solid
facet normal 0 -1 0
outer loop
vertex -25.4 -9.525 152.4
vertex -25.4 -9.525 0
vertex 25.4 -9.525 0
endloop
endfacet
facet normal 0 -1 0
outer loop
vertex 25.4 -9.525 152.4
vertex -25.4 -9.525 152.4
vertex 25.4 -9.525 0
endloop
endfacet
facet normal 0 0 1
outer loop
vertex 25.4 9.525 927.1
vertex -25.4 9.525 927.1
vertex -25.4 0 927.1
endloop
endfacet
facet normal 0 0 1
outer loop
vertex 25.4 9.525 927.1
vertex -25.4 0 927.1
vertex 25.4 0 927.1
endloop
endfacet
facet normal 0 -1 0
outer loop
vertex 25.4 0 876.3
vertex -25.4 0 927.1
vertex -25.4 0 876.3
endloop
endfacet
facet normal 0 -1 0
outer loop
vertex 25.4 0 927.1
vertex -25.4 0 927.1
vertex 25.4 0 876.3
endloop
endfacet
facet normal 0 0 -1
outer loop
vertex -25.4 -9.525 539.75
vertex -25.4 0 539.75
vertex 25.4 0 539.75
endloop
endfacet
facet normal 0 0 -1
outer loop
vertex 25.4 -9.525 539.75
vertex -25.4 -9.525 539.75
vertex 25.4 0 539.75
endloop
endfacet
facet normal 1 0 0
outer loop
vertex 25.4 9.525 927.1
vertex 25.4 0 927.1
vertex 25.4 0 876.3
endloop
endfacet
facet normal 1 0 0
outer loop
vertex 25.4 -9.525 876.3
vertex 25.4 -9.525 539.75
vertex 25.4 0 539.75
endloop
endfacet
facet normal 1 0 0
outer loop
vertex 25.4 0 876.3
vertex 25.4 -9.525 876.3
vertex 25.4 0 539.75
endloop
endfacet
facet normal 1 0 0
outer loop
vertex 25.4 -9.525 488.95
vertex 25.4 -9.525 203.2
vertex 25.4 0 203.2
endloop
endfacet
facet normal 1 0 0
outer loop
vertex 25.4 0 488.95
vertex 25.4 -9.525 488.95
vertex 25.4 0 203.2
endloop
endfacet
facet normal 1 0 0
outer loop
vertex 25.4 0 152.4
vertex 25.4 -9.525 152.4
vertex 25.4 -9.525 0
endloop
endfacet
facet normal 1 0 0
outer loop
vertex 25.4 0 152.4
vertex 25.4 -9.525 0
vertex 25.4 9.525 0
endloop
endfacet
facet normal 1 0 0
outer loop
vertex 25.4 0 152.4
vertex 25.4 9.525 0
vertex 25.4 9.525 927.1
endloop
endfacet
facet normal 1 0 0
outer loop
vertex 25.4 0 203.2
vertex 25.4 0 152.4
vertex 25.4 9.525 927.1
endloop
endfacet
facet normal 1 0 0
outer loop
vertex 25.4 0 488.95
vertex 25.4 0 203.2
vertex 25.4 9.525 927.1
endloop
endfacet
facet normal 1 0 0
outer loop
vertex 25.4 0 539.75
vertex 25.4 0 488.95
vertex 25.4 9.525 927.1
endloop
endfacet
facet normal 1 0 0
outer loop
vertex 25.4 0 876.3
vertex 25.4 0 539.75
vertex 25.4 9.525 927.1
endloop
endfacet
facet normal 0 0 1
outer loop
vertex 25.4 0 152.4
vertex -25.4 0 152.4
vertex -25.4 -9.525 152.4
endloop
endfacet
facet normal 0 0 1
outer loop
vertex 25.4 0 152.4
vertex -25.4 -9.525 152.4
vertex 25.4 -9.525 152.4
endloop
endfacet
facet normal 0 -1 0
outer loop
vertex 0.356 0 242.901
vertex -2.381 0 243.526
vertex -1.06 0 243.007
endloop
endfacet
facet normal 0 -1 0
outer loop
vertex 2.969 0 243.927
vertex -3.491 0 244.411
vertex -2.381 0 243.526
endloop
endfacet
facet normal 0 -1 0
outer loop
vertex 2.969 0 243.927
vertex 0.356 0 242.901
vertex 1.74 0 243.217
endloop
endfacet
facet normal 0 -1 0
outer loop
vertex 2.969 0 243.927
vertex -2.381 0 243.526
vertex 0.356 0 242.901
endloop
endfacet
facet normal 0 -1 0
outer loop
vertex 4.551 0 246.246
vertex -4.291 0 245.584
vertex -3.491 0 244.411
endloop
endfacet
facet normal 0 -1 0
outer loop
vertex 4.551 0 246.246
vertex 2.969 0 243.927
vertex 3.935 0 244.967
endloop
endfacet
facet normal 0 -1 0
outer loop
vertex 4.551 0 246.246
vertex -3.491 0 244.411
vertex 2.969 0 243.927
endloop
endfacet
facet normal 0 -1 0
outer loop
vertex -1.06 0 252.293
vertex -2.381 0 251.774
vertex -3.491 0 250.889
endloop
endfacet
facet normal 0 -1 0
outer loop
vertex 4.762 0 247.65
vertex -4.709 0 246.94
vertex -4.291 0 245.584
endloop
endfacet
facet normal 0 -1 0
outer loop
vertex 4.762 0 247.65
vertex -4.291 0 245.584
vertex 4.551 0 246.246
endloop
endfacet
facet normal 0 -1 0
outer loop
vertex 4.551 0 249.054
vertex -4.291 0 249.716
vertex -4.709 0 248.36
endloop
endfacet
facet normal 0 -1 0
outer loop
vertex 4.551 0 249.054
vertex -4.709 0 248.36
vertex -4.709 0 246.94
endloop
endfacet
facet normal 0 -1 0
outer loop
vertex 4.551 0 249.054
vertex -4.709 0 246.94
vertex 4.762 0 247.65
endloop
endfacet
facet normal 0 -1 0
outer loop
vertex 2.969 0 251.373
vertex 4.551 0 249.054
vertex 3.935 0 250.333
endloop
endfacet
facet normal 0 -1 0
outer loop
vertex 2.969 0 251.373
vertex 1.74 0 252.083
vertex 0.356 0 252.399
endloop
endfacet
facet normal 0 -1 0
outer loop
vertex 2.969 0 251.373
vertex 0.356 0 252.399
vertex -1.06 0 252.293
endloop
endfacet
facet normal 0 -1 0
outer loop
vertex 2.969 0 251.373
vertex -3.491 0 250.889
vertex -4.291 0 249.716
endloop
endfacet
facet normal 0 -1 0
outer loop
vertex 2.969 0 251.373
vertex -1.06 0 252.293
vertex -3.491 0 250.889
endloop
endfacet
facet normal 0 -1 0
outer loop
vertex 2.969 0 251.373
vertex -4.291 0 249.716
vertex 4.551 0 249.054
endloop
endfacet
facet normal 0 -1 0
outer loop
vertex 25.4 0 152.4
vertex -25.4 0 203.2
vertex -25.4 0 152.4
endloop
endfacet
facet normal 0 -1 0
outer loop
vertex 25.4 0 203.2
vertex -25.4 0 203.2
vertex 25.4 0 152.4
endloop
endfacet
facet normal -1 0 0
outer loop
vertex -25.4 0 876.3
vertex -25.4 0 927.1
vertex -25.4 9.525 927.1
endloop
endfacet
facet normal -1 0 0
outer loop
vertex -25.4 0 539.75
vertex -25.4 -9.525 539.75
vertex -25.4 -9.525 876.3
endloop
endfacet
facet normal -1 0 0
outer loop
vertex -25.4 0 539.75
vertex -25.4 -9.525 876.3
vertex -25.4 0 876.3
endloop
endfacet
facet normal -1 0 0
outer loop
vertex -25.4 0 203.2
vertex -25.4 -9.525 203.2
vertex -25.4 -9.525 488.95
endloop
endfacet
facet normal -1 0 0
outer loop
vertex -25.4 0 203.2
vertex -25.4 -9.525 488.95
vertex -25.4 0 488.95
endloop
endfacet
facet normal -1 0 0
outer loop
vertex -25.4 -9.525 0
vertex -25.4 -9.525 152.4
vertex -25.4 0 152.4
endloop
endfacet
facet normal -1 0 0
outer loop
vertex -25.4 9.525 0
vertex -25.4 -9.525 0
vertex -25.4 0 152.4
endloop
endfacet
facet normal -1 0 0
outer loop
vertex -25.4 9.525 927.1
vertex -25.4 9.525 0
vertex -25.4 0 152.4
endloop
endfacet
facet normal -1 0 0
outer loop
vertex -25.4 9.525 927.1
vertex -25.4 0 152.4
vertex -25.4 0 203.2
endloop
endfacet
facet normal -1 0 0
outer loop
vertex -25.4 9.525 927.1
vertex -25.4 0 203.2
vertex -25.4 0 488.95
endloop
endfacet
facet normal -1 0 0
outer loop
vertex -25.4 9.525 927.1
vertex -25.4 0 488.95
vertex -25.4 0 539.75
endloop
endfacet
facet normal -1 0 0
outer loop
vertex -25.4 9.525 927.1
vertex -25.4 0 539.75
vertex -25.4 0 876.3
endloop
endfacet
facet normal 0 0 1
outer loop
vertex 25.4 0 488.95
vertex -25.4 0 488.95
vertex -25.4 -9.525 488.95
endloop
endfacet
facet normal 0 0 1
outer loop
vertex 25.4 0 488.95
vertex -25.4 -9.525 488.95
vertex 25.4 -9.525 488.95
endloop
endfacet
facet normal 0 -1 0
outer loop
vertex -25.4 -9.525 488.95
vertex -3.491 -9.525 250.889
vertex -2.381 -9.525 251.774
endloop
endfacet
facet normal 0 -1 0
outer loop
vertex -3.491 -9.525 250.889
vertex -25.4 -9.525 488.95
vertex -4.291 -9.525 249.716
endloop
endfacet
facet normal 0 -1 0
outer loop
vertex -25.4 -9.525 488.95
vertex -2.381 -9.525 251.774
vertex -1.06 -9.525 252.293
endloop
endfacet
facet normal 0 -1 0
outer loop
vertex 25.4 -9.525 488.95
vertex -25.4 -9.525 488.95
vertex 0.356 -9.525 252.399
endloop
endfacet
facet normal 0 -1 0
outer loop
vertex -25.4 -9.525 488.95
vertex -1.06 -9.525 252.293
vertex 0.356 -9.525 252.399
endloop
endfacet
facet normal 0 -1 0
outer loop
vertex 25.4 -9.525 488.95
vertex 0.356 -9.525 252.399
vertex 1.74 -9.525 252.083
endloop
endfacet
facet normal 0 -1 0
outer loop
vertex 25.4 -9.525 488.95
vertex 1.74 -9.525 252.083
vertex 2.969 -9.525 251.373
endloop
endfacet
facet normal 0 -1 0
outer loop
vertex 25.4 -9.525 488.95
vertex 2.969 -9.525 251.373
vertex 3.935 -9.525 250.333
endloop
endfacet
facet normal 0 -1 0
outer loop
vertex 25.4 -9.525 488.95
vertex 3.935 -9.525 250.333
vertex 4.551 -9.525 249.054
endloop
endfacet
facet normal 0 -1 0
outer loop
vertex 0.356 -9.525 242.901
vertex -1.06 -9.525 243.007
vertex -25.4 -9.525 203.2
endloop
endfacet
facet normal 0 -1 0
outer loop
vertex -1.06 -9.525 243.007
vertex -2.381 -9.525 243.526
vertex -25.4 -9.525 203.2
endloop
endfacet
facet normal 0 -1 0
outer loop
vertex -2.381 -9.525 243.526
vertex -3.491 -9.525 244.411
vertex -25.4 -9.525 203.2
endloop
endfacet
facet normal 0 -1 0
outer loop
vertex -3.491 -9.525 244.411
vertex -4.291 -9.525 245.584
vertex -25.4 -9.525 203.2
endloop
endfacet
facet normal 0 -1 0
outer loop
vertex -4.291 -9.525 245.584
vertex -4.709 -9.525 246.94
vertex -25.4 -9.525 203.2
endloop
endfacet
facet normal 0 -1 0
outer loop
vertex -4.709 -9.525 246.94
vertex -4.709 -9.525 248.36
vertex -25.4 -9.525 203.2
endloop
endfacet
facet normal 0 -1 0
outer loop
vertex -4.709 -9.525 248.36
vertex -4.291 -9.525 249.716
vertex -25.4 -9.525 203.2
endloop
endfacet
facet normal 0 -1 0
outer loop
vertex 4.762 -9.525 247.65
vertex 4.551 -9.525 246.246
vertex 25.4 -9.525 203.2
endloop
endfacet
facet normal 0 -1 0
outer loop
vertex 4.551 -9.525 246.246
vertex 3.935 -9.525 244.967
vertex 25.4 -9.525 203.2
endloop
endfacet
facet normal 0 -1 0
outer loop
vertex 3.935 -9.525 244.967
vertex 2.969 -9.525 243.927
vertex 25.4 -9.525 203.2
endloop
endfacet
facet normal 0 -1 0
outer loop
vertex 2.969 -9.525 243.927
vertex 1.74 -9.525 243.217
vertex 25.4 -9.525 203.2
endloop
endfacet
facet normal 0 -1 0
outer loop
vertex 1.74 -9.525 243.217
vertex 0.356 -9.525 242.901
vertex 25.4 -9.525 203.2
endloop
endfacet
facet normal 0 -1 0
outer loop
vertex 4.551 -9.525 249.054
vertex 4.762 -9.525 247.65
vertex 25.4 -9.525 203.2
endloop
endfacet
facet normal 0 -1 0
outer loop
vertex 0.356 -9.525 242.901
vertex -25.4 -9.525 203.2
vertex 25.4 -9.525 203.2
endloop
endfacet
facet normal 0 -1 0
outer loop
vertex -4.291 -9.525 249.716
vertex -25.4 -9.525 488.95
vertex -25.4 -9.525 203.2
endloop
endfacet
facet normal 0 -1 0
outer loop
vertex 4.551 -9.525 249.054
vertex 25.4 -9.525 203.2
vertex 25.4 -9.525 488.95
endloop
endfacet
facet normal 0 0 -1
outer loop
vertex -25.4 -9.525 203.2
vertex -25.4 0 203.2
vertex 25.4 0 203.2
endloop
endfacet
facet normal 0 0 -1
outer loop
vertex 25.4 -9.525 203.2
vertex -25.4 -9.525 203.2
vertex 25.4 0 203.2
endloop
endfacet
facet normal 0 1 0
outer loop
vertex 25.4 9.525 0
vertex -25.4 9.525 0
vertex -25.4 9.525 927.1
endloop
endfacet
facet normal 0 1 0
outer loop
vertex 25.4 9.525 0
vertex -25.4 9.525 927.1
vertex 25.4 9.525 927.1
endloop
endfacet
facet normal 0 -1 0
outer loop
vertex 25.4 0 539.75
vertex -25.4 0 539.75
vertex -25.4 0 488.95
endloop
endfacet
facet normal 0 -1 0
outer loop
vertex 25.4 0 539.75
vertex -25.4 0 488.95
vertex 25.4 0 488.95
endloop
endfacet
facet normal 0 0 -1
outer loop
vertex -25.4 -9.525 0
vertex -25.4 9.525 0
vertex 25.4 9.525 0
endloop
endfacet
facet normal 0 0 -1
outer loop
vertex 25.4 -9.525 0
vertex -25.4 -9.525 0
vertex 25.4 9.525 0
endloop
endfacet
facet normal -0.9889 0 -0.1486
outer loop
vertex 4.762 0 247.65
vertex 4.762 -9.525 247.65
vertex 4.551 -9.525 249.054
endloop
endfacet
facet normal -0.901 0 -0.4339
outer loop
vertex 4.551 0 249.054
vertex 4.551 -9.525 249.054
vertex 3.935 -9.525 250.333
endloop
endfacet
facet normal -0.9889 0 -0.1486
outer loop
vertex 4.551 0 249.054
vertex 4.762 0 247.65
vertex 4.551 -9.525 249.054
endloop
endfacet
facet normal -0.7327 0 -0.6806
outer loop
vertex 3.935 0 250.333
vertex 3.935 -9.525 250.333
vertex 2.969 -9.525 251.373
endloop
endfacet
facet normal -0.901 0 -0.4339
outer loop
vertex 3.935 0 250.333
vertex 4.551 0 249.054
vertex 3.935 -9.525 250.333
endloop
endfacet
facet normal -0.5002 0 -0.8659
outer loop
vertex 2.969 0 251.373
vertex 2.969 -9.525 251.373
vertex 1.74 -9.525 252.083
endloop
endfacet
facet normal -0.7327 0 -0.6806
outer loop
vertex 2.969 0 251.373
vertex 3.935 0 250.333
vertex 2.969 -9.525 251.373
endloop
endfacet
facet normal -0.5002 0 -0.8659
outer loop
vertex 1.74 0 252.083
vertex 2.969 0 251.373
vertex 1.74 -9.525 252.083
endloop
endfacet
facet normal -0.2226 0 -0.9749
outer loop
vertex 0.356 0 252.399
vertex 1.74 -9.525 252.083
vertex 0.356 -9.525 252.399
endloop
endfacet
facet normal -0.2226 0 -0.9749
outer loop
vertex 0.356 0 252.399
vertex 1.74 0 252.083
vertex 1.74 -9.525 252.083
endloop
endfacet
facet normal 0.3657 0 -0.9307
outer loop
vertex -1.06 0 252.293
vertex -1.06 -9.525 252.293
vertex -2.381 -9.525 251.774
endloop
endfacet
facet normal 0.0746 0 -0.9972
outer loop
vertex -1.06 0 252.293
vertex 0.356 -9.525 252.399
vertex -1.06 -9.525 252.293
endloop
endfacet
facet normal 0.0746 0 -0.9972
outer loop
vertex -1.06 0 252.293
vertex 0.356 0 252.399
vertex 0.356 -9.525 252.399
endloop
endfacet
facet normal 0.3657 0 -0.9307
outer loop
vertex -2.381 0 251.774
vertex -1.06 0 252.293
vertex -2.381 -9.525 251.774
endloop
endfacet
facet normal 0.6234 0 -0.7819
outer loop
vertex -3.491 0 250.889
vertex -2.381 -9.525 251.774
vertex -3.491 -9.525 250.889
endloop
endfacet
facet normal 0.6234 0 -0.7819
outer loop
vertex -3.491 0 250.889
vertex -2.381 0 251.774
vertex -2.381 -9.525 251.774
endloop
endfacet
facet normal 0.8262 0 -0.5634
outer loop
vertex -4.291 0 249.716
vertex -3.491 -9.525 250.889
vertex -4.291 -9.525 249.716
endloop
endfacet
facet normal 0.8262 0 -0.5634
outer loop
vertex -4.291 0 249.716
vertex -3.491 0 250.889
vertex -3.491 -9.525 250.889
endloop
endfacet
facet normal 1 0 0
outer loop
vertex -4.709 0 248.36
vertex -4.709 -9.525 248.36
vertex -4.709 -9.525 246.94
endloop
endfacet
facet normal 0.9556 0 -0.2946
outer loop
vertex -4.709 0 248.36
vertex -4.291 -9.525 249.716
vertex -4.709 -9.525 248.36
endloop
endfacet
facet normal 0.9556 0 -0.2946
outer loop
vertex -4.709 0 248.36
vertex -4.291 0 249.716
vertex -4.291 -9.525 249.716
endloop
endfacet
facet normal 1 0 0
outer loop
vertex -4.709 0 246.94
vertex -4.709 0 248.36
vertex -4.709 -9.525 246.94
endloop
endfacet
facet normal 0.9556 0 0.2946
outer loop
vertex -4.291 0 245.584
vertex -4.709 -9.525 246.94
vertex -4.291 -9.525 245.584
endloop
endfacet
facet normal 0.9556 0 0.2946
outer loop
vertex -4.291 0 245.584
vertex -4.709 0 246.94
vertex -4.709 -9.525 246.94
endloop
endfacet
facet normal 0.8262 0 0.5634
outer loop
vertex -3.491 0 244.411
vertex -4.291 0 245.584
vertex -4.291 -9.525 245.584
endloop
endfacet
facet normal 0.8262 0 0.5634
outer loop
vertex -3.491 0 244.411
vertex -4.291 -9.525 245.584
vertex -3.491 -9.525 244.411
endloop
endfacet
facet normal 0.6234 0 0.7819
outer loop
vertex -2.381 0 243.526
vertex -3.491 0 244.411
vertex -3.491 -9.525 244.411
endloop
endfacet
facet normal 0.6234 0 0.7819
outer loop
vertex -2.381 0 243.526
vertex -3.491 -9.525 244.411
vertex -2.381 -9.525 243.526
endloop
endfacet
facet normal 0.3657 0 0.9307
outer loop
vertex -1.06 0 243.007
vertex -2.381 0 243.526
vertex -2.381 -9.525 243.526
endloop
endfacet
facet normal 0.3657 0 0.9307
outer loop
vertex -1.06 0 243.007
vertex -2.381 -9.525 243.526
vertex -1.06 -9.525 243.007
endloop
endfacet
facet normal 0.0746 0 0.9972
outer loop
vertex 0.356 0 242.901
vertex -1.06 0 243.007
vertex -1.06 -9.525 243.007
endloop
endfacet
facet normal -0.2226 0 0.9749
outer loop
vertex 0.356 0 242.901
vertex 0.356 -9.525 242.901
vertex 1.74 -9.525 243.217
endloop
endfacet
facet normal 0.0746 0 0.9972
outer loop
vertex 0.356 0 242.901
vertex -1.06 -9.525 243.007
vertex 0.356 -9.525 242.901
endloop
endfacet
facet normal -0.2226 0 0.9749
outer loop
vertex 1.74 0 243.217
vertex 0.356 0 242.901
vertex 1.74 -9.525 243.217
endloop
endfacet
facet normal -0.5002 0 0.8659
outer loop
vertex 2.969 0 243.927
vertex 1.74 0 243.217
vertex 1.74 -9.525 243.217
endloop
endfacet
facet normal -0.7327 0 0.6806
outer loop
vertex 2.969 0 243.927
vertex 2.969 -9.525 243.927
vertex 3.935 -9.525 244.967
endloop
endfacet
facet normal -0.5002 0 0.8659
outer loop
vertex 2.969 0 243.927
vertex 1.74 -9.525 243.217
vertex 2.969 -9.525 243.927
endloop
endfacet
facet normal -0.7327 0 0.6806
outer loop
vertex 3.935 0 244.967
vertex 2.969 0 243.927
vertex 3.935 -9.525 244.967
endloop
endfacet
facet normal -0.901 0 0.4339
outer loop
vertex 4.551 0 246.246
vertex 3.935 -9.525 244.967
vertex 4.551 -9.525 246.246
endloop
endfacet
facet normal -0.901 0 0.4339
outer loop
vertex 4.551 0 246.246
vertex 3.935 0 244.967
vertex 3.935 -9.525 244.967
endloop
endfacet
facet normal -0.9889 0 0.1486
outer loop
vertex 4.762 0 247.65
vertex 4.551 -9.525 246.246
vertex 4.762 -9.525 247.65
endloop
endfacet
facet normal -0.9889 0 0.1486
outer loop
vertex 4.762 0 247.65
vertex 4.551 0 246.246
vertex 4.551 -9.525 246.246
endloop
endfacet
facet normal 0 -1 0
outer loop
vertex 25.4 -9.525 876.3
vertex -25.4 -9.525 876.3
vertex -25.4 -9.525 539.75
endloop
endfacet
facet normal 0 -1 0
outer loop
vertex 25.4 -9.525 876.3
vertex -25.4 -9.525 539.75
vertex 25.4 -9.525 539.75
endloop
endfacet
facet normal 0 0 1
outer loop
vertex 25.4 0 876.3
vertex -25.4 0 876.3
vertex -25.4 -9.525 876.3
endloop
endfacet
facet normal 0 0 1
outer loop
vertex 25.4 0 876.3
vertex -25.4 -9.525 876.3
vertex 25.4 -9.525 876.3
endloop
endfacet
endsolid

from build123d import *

# Parameters (mm, degrees)
F0_W     = 50.8
F0_H     = 19.05
F1_DEPTH = 927.1
F2_W     = 122.43557321
F2_H     = 50.8
F2_W_2   = 343.1604206562
F2_W_3   = 264.5317912102
F3_DEPTH = 25.4
F4_R     = 4.7625
F5_DEPTH = 25.4


# Not quite as in the source:
# - a feature names something its author has since deleted; it is built from what else it names


with BuildPart() as f1:
    # F0 (on Top) → F1 (new body)
    with BuildSketch(Plane.XY):
        Rectangle(F0_W, F0_H)
    extrude(amount=F1_DEPTH)

    # F2 (on Front) → F3 (cut)
    with BuildSketch(Plane.XZ):
        with Locations((22.4465244144, 177.8)):
            Rectangle(F2_W, F2_H)
        with Locations((-38.7818217278, 901.7)):
            Rectangle(F2_W_2, F2_H)
        with Locations((-47.6498156786, 514.35)):
            Rectangle(F2_W_3, F2_H)
    extrude(amount=F3_DEPTH, mode=Mode.SUBTRACT)

    # F4 (on Front) → F5 (cut)
    with BuildSketch(Plane.XZ):
        with Locations((0, 247.65)):
            Circle(F4_R)
    extrude(amount=F5_DEPTH, mode=Mode.SUBTRACT)


solid = f1.part
